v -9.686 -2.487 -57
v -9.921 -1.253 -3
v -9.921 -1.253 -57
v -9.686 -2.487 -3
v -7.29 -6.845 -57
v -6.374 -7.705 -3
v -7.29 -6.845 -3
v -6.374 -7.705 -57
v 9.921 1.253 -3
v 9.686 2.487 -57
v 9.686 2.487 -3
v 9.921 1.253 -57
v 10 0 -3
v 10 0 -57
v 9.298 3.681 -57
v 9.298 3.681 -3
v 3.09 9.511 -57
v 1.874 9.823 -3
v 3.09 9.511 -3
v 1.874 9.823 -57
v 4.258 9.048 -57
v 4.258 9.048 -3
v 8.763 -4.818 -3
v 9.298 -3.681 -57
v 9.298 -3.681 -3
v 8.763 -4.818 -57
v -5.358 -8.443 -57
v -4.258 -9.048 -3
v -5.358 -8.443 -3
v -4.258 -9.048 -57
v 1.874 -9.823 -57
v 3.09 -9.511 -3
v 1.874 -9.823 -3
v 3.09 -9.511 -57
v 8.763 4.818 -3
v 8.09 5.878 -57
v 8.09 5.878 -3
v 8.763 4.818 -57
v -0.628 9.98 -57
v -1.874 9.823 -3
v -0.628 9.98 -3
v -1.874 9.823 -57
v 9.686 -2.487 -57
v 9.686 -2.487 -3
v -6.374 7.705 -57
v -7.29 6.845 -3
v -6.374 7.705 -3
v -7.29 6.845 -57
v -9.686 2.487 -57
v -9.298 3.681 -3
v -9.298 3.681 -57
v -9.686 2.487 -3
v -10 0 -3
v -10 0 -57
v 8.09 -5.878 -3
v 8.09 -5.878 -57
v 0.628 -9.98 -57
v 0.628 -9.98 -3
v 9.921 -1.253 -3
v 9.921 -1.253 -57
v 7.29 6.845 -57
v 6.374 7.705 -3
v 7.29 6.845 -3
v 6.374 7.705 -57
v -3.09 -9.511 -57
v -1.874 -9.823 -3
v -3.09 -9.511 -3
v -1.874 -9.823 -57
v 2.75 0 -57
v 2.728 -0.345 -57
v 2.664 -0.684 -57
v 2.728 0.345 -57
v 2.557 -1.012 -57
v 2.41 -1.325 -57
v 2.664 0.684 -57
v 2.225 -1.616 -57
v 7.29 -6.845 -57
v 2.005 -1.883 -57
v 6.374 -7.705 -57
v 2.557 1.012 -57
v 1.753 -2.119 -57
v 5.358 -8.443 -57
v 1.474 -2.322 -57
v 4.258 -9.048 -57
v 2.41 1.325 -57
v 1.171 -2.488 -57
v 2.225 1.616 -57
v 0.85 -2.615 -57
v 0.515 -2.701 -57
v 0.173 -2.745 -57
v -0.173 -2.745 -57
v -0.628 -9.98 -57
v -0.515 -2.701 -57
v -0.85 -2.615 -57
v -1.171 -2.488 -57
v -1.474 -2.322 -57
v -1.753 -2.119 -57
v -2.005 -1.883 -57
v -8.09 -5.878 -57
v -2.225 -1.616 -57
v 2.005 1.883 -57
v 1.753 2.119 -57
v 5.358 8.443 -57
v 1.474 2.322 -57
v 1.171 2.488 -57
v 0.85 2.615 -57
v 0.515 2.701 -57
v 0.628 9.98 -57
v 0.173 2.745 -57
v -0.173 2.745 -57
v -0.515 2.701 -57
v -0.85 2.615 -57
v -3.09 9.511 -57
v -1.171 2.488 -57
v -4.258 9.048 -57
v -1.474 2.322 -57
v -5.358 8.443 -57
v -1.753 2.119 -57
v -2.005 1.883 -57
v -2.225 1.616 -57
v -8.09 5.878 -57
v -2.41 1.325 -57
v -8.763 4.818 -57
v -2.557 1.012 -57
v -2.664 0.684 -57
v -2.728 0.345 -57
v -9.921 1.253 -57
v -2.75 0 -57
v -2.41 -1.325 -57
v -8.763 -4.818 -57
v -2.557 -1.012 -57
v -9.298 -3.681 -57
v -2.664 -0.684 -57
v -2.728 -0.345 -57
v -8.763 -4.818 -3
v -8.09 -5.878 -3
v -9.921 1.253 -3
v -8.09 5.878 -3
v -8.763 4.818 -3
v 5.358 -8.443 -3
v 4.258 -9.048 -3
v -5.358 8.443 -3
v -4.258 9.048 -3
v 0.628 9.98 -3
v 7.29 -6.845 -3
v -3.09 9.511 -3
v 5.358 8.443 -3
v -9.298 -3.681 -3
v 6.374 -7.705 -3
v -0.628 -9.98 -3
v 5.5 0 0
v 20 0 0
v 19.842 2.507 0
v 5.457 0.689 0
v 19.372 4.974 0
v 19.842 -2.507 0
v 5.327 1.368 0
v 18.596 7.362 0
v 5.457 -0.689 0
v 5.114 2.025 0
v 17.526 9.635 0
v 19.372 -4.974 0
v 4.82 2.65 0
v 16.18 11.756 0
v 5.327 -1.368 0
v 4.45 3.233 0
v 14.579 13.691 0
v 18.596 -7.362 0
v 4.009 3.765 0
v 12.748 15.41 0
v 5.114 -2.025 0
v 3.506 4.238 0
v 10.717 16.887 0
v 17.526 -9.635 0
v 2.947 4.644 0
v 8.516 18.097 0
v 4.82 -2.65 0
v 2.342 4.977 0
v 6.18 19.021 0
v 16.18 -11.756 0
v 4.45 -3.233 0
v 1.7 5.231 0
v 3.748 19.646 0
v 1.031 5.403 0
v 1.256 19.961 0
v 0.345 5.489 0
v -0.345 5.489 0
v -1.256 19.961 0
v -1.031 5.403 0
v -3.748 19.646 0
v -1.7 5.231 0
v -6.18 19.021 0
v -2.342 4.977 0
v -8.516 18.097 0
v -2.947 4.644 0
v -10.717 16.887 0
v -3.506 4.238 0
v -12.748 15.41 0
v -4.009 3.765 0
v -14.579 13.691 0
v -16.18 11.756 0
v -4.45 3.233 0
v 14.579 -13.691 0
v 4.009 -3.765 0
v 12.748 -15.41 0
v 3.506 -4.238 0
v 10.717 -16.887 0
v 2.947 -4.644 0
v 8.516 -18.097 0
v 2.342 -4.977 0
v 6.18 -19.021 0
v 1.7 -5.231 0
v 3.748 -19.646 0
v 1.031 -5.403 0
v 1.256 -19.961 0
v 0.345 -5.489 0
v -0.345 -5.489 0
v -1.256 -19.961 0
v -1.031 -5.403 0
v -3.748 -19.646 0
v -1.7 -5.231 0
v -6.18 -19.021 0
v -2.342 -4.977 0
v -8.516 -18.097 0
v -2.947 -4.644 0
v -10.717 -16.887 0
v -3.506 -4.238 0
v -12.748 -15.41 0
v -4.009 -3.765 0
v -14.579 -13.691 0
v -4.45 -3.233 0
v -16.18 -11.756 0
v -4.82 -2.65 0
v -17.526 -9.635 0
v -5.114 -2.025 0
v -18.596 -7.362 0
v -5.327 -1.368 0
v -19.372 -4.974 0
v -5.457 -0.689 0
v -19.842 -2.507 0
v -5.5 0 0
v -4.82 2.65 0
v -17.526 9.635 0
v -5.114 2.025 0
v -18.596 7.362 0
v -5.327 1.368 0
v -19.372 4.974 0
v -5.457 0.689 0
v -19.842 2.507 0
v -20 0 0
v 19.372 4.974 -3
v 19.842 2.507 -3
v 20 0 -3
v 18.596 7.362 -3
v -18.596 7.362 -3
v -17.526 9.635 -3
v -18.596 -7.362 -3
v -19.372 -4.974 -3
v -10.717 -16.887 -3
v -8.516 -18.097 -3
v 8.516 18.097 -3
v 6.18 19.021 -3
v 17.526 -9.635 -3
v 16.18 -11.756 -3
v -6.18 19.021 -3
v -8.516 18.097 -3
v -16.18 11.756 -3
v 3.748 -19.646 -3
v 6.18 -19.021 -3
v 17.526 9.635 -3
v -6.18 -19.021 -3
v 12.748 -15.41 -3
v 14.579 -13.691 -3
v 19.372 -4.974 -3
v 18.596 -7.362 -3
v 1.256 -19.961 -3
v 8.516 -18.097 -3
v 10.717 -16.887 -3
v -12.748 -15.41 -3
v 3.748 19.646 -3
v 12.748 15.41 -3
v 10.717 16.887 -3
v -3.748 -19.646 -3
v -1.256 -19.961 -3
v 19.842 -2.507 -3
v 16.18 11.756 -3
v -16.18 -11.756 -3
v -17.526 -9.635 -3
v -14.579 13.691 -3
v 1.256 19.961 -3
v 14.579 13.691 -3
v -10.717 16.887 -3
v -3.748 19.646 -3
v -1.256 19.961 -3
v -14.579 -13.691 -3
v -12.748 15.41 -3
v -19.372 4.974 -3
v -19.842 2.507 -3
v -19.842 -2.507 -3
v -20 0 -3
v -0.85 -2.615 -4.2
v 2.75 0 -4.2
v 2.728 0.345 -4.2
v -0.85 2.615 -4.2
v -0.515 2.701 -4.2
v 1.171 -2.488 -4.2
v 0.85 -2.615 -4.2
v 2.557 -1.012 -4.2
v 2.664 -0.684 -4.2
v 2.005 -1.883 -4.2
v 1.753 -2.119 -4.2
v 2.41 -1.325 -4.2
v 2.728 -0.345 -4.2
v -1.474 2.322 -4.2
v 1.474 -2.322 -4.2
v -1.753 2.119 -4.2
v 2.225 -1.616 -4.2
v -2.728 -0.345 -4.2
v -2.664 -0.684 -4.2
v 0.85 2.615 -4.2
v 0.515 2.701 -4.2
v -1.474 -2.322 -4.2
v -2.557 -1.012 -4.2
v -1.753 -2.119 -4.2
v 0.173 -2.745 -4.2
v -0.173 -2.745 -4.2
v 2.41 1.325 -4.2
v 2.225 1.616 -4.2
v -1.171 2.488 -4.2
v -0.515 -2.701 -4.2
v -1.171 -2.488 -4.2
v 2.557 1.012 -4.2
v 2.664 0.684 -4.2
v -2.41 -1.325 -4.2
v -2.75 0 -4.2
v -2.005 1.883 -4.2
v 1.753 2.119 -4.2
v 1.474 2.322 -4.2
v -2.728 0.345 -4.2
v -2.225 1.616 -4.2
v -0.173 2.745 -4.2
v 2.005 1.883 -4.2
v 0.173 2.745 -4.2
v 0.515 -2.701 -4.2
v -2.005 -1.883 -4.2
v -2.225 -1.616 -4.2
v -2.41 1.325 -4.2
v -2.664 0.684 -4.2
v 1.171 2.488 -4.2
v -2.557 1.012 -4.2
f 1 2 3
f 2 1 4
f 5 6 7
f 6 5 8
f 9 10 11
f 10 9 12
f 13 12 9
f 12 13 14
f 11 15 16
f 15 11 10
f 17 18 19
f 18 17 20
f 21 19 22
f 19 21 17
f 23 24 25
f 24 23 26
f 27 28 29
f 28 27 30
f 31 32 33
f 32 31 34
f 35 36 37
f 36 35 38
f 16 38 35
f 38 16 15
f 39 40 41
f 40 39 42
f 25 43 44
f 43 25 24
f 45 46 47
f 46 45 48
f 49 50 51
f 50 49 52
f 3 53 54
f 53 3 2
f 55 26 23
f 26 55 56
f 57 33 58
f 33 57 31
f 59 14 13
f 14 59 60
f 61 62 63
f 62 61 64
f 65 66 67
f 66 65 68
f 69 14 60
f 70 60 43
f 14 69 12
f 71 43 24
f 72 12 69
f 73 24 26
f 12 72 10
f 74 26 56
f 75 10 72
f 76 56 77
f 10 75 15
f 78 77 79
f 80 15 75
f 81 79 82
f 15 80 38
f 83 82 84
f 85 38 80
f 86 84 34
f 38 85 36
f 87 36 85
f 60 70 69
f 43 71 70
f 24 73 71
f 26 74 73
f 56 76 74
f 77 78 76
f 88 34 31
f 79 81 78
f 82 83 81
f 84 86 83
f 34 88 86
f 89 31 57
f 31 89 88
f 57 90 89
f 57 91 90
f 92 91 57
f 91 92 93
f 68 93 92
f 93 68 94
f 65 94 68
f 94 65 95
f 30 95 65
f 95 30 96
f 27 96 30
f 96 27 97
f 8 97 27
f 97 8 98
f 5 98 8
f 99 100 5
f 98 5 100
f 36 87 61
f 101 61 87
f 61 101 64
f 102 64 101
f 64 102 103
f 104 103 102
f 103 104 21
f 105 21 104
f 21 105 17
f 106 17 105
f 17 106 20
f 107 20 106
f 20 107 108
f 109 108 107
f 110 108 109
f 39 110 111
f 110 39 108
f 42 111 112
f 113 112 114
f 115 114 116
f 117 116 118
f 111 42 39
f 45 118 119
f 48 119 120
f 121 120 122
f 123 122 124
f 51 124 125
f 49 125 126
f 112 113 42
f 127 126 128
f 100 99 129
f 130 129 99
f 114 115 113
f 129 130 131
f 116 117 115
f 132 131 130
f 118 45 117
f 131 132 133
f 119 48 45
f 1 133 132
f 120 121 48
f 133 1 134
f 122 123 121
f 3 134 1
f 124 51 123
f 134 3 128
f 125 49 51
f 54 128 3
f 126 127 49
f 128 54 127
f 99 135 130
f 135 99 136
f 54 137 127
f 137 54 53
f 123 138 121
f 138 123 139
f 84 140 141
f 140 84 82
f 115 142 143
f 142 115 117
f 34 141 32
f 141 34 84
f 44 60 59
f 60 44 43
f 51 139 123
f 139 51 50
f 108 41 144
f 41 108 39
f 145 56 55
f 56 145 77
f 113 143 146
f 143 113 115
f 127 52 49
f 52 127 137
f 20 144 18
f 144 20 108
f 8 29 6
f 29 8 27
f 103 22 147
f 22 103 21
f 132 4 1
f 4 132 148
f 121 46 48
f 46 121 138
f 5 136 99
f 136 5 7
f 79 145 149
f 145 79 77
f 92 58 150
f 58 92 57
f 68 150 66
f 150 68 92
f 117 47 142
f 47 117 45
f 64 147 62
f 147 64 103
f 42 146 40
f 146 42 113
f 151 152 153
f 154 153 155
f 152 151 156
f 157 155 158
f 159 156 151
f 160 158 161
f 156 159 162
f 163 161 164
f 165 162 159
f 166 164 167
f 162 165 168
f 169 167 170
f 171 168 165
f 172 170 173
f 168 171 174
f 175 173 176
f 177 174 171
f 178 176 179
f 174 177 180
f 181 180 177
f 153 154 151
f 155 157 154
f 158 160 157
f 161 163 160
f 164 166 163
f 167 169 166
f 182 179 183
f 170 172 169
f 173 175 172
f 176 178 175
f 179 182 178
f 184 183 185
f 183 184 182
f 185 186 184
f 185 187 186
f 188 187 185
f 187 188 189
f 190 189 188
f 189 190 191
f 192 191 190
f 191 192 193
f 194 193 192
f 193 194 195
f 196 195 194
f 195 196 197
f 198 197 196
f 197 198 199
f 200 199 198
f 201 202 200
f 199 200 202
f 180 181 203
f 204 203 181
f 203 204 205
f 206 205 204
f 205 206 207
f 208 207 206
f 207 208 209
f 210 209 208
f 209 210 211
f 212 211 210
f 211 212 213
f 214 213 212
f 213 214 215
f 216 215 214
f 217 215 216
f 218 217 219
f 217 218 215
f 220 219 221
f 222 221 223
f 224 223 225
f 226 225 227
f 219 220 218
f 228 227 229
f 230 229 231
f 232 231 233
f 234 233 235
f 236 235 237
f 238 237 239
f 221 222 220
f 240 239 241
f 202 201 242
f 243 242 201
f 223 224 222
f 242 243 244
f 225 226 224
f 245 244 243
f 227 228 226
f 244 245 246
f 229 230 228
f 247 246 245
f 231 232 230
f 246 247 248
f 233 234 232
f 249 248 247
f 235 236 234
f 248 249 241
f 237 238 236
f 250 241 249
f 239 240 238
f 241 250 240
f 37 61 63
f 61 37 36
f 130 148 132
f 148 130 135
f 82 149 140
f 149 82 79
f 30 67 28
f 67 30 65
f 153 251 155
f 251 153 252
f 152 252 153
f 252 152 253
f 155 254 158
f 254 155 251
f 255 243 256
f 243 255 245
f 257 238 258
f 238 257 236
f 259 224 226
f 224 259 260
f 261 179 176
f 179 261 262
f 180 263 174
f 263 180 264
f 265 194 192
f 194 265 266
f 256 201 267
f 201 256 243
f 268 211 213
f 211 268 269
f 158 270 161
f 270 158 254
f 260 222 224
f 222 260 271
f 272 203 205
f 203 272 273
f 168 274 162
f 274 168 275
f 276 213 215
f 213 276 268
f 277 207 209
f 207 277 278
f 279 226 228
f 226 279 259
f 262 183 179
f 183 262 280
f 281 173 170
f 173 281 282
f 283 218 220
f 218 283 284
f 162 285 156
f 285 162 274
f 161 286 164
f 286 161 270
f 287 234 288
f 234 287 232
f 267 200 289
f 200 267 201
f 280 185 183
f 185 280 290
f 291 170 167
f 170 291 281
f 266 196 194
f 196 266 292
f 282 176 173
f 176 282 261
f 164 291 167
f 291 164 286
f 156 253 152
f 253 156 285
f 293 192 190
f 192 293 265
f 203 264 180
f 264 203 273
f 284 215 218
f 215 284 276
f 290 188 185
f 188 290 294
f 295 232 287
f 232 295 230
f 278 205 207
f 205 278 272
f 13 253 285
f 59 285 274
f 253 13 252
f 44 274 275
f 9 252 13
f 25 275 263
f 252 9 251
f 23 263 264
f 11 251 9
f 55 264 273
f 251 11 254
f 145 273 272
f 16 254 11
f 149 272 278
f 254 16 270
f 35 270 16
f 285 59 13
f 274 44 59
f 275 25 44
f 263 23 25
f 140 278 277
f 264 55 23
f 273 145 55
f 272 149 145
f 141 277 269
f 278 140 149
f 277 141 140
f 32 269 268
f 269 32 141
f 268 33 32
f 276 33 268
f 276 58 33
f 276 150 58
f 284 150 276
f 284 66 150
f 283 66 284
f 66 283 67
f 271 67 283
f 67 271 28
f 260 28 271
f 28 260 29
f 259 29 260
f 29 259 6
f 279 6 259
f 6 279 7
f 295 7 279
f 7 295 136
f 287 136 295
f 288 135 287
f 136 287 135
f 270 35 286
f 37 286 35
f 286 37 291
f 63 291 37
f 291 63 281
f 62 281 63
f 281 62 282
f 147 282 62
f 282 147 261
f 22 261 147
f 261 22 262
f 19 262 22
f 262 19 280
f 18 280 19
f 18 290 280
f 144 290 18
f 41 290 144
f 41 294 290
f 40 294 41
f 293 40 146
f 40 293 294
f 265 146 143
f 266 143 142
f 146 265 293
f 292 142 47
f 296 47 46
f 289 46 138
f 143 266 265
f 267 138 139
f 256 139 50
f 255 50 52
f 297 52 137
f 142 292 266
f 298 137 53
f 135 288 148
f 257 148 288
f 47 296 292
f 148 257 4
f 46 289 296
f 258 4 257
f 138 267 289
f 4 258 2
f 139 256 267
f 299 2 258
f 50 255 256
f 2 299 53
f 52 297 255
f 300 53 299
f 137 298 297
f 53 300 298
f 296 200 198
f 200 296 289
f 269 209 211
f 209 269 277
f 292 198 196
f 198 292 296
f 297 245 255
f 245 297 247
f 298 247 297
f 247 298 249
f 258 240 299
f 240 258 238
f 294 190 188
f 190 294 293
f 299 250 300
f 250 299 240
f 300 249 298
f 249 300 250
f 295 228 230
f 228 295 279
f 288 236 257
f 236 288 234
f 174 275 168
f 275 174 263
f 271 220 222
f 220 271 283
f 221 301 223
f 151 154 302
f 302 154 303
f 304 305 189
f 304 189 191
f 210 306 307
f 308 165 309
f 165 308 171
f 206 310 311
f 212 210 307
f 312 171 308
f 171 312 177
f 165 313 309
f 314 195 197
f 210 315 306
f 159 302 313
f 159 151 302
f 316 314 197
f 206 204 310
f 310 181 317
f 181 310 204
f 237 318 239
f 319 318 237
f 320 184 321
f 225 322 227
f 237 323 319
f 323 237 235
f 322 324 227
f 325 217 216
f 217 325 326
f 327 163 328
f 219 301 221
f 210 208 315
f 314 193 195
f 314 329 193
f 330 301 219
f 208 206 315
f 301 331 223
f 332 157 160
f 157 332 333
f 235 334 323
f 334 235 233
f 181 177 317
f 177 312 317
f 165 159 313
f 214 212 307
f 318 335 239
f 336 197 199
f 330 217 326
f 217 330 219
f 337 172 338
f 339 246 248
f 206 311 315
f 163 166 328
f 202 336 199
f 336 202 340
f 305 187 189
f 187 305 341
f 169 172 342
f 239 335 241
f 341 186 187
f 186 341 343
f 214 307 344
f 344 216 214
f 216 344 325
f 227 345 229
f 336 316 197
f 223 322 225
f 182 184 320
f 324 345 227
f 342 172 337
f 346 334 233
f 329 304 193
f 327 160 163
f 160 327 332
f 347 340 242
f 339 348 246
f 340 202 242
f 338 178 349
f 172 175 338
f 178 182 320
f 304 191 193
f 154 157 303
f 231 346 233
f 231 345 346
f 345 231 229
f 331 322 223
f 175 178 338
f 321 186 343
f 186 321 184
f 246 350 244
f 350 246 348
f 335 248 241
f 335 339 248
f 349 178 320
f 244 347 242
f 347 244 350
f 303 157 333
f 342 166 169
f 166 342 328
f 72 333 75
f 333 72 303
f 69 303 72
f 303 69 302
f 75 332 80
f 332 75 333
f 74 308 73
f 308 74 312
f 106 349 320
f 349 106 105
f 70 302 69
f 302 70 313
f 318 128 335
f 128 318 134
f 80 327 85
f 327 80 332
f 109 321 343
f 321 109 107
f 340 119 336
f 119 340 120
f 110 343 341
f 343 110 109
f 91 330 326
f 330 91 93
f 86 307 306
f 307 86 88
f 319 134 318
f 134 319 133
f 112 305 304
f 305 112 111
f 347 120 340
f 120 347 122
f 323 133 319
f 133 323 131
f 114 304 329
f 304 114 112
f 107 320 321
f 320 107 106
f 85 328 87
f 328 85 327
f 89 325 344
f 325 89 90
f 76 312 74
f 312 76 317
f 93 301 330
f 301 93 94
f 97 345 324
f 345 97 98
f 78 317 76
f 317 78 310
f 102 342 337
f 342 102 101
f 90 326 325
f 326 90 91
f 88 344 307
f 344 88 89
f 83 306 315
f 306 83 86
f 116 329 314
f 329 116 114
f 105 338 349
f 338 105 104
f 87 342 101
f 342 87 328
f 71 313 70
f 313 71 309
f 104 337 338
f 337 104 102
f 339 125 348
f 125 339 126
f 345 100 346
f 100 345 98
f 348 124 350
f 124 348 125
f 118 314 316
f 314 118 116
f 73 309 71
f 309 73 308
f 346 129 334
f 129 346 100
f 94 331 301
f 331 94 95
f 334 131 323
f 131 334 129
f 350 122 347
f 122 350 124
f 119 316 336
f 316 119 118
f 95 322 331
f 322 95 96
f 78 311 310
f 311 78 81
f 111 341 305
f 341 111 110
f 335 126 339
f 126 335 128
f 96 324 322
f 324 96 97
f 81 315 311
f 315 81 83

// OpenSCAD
$fn = 50;


difference() {
	union() {
		translate(v = [0, 0, -57.0000000000]) {
			cylinder(h = 57, r = 10.0000000000);
		}
		translate(v = [0, 0, -3.0000000000]) {
			cylinder(h = 3, r = 20.0000000000);
		}
	}
	union() {
		translate(v = [0, 0, 0]) {
			rotate(a = [0, 0, 0]) {
				difference() {
					union() {
						#translate(v = [0, 0, -57.0000000000]) {
							cylinder(h = 57, r = 2.2500000000);
						}
						#translate(v = [0, 0, -4.2000000000]) {
							cylinder(h = 4.2000000000, r1 = 2.7500000000, r2 = 5.5000000000);
						}
						#translate(v = [0, 0, -57.0000000000]) {
							cylinder(h = 57, r = 2.7500000000);
						}
						#translate(v = [0, 0, -57.0000000000]) {
							cylinder(h = 57, r = 2.2500000000);
						}
					}
					union();
				}
			}
		}
	}
}
